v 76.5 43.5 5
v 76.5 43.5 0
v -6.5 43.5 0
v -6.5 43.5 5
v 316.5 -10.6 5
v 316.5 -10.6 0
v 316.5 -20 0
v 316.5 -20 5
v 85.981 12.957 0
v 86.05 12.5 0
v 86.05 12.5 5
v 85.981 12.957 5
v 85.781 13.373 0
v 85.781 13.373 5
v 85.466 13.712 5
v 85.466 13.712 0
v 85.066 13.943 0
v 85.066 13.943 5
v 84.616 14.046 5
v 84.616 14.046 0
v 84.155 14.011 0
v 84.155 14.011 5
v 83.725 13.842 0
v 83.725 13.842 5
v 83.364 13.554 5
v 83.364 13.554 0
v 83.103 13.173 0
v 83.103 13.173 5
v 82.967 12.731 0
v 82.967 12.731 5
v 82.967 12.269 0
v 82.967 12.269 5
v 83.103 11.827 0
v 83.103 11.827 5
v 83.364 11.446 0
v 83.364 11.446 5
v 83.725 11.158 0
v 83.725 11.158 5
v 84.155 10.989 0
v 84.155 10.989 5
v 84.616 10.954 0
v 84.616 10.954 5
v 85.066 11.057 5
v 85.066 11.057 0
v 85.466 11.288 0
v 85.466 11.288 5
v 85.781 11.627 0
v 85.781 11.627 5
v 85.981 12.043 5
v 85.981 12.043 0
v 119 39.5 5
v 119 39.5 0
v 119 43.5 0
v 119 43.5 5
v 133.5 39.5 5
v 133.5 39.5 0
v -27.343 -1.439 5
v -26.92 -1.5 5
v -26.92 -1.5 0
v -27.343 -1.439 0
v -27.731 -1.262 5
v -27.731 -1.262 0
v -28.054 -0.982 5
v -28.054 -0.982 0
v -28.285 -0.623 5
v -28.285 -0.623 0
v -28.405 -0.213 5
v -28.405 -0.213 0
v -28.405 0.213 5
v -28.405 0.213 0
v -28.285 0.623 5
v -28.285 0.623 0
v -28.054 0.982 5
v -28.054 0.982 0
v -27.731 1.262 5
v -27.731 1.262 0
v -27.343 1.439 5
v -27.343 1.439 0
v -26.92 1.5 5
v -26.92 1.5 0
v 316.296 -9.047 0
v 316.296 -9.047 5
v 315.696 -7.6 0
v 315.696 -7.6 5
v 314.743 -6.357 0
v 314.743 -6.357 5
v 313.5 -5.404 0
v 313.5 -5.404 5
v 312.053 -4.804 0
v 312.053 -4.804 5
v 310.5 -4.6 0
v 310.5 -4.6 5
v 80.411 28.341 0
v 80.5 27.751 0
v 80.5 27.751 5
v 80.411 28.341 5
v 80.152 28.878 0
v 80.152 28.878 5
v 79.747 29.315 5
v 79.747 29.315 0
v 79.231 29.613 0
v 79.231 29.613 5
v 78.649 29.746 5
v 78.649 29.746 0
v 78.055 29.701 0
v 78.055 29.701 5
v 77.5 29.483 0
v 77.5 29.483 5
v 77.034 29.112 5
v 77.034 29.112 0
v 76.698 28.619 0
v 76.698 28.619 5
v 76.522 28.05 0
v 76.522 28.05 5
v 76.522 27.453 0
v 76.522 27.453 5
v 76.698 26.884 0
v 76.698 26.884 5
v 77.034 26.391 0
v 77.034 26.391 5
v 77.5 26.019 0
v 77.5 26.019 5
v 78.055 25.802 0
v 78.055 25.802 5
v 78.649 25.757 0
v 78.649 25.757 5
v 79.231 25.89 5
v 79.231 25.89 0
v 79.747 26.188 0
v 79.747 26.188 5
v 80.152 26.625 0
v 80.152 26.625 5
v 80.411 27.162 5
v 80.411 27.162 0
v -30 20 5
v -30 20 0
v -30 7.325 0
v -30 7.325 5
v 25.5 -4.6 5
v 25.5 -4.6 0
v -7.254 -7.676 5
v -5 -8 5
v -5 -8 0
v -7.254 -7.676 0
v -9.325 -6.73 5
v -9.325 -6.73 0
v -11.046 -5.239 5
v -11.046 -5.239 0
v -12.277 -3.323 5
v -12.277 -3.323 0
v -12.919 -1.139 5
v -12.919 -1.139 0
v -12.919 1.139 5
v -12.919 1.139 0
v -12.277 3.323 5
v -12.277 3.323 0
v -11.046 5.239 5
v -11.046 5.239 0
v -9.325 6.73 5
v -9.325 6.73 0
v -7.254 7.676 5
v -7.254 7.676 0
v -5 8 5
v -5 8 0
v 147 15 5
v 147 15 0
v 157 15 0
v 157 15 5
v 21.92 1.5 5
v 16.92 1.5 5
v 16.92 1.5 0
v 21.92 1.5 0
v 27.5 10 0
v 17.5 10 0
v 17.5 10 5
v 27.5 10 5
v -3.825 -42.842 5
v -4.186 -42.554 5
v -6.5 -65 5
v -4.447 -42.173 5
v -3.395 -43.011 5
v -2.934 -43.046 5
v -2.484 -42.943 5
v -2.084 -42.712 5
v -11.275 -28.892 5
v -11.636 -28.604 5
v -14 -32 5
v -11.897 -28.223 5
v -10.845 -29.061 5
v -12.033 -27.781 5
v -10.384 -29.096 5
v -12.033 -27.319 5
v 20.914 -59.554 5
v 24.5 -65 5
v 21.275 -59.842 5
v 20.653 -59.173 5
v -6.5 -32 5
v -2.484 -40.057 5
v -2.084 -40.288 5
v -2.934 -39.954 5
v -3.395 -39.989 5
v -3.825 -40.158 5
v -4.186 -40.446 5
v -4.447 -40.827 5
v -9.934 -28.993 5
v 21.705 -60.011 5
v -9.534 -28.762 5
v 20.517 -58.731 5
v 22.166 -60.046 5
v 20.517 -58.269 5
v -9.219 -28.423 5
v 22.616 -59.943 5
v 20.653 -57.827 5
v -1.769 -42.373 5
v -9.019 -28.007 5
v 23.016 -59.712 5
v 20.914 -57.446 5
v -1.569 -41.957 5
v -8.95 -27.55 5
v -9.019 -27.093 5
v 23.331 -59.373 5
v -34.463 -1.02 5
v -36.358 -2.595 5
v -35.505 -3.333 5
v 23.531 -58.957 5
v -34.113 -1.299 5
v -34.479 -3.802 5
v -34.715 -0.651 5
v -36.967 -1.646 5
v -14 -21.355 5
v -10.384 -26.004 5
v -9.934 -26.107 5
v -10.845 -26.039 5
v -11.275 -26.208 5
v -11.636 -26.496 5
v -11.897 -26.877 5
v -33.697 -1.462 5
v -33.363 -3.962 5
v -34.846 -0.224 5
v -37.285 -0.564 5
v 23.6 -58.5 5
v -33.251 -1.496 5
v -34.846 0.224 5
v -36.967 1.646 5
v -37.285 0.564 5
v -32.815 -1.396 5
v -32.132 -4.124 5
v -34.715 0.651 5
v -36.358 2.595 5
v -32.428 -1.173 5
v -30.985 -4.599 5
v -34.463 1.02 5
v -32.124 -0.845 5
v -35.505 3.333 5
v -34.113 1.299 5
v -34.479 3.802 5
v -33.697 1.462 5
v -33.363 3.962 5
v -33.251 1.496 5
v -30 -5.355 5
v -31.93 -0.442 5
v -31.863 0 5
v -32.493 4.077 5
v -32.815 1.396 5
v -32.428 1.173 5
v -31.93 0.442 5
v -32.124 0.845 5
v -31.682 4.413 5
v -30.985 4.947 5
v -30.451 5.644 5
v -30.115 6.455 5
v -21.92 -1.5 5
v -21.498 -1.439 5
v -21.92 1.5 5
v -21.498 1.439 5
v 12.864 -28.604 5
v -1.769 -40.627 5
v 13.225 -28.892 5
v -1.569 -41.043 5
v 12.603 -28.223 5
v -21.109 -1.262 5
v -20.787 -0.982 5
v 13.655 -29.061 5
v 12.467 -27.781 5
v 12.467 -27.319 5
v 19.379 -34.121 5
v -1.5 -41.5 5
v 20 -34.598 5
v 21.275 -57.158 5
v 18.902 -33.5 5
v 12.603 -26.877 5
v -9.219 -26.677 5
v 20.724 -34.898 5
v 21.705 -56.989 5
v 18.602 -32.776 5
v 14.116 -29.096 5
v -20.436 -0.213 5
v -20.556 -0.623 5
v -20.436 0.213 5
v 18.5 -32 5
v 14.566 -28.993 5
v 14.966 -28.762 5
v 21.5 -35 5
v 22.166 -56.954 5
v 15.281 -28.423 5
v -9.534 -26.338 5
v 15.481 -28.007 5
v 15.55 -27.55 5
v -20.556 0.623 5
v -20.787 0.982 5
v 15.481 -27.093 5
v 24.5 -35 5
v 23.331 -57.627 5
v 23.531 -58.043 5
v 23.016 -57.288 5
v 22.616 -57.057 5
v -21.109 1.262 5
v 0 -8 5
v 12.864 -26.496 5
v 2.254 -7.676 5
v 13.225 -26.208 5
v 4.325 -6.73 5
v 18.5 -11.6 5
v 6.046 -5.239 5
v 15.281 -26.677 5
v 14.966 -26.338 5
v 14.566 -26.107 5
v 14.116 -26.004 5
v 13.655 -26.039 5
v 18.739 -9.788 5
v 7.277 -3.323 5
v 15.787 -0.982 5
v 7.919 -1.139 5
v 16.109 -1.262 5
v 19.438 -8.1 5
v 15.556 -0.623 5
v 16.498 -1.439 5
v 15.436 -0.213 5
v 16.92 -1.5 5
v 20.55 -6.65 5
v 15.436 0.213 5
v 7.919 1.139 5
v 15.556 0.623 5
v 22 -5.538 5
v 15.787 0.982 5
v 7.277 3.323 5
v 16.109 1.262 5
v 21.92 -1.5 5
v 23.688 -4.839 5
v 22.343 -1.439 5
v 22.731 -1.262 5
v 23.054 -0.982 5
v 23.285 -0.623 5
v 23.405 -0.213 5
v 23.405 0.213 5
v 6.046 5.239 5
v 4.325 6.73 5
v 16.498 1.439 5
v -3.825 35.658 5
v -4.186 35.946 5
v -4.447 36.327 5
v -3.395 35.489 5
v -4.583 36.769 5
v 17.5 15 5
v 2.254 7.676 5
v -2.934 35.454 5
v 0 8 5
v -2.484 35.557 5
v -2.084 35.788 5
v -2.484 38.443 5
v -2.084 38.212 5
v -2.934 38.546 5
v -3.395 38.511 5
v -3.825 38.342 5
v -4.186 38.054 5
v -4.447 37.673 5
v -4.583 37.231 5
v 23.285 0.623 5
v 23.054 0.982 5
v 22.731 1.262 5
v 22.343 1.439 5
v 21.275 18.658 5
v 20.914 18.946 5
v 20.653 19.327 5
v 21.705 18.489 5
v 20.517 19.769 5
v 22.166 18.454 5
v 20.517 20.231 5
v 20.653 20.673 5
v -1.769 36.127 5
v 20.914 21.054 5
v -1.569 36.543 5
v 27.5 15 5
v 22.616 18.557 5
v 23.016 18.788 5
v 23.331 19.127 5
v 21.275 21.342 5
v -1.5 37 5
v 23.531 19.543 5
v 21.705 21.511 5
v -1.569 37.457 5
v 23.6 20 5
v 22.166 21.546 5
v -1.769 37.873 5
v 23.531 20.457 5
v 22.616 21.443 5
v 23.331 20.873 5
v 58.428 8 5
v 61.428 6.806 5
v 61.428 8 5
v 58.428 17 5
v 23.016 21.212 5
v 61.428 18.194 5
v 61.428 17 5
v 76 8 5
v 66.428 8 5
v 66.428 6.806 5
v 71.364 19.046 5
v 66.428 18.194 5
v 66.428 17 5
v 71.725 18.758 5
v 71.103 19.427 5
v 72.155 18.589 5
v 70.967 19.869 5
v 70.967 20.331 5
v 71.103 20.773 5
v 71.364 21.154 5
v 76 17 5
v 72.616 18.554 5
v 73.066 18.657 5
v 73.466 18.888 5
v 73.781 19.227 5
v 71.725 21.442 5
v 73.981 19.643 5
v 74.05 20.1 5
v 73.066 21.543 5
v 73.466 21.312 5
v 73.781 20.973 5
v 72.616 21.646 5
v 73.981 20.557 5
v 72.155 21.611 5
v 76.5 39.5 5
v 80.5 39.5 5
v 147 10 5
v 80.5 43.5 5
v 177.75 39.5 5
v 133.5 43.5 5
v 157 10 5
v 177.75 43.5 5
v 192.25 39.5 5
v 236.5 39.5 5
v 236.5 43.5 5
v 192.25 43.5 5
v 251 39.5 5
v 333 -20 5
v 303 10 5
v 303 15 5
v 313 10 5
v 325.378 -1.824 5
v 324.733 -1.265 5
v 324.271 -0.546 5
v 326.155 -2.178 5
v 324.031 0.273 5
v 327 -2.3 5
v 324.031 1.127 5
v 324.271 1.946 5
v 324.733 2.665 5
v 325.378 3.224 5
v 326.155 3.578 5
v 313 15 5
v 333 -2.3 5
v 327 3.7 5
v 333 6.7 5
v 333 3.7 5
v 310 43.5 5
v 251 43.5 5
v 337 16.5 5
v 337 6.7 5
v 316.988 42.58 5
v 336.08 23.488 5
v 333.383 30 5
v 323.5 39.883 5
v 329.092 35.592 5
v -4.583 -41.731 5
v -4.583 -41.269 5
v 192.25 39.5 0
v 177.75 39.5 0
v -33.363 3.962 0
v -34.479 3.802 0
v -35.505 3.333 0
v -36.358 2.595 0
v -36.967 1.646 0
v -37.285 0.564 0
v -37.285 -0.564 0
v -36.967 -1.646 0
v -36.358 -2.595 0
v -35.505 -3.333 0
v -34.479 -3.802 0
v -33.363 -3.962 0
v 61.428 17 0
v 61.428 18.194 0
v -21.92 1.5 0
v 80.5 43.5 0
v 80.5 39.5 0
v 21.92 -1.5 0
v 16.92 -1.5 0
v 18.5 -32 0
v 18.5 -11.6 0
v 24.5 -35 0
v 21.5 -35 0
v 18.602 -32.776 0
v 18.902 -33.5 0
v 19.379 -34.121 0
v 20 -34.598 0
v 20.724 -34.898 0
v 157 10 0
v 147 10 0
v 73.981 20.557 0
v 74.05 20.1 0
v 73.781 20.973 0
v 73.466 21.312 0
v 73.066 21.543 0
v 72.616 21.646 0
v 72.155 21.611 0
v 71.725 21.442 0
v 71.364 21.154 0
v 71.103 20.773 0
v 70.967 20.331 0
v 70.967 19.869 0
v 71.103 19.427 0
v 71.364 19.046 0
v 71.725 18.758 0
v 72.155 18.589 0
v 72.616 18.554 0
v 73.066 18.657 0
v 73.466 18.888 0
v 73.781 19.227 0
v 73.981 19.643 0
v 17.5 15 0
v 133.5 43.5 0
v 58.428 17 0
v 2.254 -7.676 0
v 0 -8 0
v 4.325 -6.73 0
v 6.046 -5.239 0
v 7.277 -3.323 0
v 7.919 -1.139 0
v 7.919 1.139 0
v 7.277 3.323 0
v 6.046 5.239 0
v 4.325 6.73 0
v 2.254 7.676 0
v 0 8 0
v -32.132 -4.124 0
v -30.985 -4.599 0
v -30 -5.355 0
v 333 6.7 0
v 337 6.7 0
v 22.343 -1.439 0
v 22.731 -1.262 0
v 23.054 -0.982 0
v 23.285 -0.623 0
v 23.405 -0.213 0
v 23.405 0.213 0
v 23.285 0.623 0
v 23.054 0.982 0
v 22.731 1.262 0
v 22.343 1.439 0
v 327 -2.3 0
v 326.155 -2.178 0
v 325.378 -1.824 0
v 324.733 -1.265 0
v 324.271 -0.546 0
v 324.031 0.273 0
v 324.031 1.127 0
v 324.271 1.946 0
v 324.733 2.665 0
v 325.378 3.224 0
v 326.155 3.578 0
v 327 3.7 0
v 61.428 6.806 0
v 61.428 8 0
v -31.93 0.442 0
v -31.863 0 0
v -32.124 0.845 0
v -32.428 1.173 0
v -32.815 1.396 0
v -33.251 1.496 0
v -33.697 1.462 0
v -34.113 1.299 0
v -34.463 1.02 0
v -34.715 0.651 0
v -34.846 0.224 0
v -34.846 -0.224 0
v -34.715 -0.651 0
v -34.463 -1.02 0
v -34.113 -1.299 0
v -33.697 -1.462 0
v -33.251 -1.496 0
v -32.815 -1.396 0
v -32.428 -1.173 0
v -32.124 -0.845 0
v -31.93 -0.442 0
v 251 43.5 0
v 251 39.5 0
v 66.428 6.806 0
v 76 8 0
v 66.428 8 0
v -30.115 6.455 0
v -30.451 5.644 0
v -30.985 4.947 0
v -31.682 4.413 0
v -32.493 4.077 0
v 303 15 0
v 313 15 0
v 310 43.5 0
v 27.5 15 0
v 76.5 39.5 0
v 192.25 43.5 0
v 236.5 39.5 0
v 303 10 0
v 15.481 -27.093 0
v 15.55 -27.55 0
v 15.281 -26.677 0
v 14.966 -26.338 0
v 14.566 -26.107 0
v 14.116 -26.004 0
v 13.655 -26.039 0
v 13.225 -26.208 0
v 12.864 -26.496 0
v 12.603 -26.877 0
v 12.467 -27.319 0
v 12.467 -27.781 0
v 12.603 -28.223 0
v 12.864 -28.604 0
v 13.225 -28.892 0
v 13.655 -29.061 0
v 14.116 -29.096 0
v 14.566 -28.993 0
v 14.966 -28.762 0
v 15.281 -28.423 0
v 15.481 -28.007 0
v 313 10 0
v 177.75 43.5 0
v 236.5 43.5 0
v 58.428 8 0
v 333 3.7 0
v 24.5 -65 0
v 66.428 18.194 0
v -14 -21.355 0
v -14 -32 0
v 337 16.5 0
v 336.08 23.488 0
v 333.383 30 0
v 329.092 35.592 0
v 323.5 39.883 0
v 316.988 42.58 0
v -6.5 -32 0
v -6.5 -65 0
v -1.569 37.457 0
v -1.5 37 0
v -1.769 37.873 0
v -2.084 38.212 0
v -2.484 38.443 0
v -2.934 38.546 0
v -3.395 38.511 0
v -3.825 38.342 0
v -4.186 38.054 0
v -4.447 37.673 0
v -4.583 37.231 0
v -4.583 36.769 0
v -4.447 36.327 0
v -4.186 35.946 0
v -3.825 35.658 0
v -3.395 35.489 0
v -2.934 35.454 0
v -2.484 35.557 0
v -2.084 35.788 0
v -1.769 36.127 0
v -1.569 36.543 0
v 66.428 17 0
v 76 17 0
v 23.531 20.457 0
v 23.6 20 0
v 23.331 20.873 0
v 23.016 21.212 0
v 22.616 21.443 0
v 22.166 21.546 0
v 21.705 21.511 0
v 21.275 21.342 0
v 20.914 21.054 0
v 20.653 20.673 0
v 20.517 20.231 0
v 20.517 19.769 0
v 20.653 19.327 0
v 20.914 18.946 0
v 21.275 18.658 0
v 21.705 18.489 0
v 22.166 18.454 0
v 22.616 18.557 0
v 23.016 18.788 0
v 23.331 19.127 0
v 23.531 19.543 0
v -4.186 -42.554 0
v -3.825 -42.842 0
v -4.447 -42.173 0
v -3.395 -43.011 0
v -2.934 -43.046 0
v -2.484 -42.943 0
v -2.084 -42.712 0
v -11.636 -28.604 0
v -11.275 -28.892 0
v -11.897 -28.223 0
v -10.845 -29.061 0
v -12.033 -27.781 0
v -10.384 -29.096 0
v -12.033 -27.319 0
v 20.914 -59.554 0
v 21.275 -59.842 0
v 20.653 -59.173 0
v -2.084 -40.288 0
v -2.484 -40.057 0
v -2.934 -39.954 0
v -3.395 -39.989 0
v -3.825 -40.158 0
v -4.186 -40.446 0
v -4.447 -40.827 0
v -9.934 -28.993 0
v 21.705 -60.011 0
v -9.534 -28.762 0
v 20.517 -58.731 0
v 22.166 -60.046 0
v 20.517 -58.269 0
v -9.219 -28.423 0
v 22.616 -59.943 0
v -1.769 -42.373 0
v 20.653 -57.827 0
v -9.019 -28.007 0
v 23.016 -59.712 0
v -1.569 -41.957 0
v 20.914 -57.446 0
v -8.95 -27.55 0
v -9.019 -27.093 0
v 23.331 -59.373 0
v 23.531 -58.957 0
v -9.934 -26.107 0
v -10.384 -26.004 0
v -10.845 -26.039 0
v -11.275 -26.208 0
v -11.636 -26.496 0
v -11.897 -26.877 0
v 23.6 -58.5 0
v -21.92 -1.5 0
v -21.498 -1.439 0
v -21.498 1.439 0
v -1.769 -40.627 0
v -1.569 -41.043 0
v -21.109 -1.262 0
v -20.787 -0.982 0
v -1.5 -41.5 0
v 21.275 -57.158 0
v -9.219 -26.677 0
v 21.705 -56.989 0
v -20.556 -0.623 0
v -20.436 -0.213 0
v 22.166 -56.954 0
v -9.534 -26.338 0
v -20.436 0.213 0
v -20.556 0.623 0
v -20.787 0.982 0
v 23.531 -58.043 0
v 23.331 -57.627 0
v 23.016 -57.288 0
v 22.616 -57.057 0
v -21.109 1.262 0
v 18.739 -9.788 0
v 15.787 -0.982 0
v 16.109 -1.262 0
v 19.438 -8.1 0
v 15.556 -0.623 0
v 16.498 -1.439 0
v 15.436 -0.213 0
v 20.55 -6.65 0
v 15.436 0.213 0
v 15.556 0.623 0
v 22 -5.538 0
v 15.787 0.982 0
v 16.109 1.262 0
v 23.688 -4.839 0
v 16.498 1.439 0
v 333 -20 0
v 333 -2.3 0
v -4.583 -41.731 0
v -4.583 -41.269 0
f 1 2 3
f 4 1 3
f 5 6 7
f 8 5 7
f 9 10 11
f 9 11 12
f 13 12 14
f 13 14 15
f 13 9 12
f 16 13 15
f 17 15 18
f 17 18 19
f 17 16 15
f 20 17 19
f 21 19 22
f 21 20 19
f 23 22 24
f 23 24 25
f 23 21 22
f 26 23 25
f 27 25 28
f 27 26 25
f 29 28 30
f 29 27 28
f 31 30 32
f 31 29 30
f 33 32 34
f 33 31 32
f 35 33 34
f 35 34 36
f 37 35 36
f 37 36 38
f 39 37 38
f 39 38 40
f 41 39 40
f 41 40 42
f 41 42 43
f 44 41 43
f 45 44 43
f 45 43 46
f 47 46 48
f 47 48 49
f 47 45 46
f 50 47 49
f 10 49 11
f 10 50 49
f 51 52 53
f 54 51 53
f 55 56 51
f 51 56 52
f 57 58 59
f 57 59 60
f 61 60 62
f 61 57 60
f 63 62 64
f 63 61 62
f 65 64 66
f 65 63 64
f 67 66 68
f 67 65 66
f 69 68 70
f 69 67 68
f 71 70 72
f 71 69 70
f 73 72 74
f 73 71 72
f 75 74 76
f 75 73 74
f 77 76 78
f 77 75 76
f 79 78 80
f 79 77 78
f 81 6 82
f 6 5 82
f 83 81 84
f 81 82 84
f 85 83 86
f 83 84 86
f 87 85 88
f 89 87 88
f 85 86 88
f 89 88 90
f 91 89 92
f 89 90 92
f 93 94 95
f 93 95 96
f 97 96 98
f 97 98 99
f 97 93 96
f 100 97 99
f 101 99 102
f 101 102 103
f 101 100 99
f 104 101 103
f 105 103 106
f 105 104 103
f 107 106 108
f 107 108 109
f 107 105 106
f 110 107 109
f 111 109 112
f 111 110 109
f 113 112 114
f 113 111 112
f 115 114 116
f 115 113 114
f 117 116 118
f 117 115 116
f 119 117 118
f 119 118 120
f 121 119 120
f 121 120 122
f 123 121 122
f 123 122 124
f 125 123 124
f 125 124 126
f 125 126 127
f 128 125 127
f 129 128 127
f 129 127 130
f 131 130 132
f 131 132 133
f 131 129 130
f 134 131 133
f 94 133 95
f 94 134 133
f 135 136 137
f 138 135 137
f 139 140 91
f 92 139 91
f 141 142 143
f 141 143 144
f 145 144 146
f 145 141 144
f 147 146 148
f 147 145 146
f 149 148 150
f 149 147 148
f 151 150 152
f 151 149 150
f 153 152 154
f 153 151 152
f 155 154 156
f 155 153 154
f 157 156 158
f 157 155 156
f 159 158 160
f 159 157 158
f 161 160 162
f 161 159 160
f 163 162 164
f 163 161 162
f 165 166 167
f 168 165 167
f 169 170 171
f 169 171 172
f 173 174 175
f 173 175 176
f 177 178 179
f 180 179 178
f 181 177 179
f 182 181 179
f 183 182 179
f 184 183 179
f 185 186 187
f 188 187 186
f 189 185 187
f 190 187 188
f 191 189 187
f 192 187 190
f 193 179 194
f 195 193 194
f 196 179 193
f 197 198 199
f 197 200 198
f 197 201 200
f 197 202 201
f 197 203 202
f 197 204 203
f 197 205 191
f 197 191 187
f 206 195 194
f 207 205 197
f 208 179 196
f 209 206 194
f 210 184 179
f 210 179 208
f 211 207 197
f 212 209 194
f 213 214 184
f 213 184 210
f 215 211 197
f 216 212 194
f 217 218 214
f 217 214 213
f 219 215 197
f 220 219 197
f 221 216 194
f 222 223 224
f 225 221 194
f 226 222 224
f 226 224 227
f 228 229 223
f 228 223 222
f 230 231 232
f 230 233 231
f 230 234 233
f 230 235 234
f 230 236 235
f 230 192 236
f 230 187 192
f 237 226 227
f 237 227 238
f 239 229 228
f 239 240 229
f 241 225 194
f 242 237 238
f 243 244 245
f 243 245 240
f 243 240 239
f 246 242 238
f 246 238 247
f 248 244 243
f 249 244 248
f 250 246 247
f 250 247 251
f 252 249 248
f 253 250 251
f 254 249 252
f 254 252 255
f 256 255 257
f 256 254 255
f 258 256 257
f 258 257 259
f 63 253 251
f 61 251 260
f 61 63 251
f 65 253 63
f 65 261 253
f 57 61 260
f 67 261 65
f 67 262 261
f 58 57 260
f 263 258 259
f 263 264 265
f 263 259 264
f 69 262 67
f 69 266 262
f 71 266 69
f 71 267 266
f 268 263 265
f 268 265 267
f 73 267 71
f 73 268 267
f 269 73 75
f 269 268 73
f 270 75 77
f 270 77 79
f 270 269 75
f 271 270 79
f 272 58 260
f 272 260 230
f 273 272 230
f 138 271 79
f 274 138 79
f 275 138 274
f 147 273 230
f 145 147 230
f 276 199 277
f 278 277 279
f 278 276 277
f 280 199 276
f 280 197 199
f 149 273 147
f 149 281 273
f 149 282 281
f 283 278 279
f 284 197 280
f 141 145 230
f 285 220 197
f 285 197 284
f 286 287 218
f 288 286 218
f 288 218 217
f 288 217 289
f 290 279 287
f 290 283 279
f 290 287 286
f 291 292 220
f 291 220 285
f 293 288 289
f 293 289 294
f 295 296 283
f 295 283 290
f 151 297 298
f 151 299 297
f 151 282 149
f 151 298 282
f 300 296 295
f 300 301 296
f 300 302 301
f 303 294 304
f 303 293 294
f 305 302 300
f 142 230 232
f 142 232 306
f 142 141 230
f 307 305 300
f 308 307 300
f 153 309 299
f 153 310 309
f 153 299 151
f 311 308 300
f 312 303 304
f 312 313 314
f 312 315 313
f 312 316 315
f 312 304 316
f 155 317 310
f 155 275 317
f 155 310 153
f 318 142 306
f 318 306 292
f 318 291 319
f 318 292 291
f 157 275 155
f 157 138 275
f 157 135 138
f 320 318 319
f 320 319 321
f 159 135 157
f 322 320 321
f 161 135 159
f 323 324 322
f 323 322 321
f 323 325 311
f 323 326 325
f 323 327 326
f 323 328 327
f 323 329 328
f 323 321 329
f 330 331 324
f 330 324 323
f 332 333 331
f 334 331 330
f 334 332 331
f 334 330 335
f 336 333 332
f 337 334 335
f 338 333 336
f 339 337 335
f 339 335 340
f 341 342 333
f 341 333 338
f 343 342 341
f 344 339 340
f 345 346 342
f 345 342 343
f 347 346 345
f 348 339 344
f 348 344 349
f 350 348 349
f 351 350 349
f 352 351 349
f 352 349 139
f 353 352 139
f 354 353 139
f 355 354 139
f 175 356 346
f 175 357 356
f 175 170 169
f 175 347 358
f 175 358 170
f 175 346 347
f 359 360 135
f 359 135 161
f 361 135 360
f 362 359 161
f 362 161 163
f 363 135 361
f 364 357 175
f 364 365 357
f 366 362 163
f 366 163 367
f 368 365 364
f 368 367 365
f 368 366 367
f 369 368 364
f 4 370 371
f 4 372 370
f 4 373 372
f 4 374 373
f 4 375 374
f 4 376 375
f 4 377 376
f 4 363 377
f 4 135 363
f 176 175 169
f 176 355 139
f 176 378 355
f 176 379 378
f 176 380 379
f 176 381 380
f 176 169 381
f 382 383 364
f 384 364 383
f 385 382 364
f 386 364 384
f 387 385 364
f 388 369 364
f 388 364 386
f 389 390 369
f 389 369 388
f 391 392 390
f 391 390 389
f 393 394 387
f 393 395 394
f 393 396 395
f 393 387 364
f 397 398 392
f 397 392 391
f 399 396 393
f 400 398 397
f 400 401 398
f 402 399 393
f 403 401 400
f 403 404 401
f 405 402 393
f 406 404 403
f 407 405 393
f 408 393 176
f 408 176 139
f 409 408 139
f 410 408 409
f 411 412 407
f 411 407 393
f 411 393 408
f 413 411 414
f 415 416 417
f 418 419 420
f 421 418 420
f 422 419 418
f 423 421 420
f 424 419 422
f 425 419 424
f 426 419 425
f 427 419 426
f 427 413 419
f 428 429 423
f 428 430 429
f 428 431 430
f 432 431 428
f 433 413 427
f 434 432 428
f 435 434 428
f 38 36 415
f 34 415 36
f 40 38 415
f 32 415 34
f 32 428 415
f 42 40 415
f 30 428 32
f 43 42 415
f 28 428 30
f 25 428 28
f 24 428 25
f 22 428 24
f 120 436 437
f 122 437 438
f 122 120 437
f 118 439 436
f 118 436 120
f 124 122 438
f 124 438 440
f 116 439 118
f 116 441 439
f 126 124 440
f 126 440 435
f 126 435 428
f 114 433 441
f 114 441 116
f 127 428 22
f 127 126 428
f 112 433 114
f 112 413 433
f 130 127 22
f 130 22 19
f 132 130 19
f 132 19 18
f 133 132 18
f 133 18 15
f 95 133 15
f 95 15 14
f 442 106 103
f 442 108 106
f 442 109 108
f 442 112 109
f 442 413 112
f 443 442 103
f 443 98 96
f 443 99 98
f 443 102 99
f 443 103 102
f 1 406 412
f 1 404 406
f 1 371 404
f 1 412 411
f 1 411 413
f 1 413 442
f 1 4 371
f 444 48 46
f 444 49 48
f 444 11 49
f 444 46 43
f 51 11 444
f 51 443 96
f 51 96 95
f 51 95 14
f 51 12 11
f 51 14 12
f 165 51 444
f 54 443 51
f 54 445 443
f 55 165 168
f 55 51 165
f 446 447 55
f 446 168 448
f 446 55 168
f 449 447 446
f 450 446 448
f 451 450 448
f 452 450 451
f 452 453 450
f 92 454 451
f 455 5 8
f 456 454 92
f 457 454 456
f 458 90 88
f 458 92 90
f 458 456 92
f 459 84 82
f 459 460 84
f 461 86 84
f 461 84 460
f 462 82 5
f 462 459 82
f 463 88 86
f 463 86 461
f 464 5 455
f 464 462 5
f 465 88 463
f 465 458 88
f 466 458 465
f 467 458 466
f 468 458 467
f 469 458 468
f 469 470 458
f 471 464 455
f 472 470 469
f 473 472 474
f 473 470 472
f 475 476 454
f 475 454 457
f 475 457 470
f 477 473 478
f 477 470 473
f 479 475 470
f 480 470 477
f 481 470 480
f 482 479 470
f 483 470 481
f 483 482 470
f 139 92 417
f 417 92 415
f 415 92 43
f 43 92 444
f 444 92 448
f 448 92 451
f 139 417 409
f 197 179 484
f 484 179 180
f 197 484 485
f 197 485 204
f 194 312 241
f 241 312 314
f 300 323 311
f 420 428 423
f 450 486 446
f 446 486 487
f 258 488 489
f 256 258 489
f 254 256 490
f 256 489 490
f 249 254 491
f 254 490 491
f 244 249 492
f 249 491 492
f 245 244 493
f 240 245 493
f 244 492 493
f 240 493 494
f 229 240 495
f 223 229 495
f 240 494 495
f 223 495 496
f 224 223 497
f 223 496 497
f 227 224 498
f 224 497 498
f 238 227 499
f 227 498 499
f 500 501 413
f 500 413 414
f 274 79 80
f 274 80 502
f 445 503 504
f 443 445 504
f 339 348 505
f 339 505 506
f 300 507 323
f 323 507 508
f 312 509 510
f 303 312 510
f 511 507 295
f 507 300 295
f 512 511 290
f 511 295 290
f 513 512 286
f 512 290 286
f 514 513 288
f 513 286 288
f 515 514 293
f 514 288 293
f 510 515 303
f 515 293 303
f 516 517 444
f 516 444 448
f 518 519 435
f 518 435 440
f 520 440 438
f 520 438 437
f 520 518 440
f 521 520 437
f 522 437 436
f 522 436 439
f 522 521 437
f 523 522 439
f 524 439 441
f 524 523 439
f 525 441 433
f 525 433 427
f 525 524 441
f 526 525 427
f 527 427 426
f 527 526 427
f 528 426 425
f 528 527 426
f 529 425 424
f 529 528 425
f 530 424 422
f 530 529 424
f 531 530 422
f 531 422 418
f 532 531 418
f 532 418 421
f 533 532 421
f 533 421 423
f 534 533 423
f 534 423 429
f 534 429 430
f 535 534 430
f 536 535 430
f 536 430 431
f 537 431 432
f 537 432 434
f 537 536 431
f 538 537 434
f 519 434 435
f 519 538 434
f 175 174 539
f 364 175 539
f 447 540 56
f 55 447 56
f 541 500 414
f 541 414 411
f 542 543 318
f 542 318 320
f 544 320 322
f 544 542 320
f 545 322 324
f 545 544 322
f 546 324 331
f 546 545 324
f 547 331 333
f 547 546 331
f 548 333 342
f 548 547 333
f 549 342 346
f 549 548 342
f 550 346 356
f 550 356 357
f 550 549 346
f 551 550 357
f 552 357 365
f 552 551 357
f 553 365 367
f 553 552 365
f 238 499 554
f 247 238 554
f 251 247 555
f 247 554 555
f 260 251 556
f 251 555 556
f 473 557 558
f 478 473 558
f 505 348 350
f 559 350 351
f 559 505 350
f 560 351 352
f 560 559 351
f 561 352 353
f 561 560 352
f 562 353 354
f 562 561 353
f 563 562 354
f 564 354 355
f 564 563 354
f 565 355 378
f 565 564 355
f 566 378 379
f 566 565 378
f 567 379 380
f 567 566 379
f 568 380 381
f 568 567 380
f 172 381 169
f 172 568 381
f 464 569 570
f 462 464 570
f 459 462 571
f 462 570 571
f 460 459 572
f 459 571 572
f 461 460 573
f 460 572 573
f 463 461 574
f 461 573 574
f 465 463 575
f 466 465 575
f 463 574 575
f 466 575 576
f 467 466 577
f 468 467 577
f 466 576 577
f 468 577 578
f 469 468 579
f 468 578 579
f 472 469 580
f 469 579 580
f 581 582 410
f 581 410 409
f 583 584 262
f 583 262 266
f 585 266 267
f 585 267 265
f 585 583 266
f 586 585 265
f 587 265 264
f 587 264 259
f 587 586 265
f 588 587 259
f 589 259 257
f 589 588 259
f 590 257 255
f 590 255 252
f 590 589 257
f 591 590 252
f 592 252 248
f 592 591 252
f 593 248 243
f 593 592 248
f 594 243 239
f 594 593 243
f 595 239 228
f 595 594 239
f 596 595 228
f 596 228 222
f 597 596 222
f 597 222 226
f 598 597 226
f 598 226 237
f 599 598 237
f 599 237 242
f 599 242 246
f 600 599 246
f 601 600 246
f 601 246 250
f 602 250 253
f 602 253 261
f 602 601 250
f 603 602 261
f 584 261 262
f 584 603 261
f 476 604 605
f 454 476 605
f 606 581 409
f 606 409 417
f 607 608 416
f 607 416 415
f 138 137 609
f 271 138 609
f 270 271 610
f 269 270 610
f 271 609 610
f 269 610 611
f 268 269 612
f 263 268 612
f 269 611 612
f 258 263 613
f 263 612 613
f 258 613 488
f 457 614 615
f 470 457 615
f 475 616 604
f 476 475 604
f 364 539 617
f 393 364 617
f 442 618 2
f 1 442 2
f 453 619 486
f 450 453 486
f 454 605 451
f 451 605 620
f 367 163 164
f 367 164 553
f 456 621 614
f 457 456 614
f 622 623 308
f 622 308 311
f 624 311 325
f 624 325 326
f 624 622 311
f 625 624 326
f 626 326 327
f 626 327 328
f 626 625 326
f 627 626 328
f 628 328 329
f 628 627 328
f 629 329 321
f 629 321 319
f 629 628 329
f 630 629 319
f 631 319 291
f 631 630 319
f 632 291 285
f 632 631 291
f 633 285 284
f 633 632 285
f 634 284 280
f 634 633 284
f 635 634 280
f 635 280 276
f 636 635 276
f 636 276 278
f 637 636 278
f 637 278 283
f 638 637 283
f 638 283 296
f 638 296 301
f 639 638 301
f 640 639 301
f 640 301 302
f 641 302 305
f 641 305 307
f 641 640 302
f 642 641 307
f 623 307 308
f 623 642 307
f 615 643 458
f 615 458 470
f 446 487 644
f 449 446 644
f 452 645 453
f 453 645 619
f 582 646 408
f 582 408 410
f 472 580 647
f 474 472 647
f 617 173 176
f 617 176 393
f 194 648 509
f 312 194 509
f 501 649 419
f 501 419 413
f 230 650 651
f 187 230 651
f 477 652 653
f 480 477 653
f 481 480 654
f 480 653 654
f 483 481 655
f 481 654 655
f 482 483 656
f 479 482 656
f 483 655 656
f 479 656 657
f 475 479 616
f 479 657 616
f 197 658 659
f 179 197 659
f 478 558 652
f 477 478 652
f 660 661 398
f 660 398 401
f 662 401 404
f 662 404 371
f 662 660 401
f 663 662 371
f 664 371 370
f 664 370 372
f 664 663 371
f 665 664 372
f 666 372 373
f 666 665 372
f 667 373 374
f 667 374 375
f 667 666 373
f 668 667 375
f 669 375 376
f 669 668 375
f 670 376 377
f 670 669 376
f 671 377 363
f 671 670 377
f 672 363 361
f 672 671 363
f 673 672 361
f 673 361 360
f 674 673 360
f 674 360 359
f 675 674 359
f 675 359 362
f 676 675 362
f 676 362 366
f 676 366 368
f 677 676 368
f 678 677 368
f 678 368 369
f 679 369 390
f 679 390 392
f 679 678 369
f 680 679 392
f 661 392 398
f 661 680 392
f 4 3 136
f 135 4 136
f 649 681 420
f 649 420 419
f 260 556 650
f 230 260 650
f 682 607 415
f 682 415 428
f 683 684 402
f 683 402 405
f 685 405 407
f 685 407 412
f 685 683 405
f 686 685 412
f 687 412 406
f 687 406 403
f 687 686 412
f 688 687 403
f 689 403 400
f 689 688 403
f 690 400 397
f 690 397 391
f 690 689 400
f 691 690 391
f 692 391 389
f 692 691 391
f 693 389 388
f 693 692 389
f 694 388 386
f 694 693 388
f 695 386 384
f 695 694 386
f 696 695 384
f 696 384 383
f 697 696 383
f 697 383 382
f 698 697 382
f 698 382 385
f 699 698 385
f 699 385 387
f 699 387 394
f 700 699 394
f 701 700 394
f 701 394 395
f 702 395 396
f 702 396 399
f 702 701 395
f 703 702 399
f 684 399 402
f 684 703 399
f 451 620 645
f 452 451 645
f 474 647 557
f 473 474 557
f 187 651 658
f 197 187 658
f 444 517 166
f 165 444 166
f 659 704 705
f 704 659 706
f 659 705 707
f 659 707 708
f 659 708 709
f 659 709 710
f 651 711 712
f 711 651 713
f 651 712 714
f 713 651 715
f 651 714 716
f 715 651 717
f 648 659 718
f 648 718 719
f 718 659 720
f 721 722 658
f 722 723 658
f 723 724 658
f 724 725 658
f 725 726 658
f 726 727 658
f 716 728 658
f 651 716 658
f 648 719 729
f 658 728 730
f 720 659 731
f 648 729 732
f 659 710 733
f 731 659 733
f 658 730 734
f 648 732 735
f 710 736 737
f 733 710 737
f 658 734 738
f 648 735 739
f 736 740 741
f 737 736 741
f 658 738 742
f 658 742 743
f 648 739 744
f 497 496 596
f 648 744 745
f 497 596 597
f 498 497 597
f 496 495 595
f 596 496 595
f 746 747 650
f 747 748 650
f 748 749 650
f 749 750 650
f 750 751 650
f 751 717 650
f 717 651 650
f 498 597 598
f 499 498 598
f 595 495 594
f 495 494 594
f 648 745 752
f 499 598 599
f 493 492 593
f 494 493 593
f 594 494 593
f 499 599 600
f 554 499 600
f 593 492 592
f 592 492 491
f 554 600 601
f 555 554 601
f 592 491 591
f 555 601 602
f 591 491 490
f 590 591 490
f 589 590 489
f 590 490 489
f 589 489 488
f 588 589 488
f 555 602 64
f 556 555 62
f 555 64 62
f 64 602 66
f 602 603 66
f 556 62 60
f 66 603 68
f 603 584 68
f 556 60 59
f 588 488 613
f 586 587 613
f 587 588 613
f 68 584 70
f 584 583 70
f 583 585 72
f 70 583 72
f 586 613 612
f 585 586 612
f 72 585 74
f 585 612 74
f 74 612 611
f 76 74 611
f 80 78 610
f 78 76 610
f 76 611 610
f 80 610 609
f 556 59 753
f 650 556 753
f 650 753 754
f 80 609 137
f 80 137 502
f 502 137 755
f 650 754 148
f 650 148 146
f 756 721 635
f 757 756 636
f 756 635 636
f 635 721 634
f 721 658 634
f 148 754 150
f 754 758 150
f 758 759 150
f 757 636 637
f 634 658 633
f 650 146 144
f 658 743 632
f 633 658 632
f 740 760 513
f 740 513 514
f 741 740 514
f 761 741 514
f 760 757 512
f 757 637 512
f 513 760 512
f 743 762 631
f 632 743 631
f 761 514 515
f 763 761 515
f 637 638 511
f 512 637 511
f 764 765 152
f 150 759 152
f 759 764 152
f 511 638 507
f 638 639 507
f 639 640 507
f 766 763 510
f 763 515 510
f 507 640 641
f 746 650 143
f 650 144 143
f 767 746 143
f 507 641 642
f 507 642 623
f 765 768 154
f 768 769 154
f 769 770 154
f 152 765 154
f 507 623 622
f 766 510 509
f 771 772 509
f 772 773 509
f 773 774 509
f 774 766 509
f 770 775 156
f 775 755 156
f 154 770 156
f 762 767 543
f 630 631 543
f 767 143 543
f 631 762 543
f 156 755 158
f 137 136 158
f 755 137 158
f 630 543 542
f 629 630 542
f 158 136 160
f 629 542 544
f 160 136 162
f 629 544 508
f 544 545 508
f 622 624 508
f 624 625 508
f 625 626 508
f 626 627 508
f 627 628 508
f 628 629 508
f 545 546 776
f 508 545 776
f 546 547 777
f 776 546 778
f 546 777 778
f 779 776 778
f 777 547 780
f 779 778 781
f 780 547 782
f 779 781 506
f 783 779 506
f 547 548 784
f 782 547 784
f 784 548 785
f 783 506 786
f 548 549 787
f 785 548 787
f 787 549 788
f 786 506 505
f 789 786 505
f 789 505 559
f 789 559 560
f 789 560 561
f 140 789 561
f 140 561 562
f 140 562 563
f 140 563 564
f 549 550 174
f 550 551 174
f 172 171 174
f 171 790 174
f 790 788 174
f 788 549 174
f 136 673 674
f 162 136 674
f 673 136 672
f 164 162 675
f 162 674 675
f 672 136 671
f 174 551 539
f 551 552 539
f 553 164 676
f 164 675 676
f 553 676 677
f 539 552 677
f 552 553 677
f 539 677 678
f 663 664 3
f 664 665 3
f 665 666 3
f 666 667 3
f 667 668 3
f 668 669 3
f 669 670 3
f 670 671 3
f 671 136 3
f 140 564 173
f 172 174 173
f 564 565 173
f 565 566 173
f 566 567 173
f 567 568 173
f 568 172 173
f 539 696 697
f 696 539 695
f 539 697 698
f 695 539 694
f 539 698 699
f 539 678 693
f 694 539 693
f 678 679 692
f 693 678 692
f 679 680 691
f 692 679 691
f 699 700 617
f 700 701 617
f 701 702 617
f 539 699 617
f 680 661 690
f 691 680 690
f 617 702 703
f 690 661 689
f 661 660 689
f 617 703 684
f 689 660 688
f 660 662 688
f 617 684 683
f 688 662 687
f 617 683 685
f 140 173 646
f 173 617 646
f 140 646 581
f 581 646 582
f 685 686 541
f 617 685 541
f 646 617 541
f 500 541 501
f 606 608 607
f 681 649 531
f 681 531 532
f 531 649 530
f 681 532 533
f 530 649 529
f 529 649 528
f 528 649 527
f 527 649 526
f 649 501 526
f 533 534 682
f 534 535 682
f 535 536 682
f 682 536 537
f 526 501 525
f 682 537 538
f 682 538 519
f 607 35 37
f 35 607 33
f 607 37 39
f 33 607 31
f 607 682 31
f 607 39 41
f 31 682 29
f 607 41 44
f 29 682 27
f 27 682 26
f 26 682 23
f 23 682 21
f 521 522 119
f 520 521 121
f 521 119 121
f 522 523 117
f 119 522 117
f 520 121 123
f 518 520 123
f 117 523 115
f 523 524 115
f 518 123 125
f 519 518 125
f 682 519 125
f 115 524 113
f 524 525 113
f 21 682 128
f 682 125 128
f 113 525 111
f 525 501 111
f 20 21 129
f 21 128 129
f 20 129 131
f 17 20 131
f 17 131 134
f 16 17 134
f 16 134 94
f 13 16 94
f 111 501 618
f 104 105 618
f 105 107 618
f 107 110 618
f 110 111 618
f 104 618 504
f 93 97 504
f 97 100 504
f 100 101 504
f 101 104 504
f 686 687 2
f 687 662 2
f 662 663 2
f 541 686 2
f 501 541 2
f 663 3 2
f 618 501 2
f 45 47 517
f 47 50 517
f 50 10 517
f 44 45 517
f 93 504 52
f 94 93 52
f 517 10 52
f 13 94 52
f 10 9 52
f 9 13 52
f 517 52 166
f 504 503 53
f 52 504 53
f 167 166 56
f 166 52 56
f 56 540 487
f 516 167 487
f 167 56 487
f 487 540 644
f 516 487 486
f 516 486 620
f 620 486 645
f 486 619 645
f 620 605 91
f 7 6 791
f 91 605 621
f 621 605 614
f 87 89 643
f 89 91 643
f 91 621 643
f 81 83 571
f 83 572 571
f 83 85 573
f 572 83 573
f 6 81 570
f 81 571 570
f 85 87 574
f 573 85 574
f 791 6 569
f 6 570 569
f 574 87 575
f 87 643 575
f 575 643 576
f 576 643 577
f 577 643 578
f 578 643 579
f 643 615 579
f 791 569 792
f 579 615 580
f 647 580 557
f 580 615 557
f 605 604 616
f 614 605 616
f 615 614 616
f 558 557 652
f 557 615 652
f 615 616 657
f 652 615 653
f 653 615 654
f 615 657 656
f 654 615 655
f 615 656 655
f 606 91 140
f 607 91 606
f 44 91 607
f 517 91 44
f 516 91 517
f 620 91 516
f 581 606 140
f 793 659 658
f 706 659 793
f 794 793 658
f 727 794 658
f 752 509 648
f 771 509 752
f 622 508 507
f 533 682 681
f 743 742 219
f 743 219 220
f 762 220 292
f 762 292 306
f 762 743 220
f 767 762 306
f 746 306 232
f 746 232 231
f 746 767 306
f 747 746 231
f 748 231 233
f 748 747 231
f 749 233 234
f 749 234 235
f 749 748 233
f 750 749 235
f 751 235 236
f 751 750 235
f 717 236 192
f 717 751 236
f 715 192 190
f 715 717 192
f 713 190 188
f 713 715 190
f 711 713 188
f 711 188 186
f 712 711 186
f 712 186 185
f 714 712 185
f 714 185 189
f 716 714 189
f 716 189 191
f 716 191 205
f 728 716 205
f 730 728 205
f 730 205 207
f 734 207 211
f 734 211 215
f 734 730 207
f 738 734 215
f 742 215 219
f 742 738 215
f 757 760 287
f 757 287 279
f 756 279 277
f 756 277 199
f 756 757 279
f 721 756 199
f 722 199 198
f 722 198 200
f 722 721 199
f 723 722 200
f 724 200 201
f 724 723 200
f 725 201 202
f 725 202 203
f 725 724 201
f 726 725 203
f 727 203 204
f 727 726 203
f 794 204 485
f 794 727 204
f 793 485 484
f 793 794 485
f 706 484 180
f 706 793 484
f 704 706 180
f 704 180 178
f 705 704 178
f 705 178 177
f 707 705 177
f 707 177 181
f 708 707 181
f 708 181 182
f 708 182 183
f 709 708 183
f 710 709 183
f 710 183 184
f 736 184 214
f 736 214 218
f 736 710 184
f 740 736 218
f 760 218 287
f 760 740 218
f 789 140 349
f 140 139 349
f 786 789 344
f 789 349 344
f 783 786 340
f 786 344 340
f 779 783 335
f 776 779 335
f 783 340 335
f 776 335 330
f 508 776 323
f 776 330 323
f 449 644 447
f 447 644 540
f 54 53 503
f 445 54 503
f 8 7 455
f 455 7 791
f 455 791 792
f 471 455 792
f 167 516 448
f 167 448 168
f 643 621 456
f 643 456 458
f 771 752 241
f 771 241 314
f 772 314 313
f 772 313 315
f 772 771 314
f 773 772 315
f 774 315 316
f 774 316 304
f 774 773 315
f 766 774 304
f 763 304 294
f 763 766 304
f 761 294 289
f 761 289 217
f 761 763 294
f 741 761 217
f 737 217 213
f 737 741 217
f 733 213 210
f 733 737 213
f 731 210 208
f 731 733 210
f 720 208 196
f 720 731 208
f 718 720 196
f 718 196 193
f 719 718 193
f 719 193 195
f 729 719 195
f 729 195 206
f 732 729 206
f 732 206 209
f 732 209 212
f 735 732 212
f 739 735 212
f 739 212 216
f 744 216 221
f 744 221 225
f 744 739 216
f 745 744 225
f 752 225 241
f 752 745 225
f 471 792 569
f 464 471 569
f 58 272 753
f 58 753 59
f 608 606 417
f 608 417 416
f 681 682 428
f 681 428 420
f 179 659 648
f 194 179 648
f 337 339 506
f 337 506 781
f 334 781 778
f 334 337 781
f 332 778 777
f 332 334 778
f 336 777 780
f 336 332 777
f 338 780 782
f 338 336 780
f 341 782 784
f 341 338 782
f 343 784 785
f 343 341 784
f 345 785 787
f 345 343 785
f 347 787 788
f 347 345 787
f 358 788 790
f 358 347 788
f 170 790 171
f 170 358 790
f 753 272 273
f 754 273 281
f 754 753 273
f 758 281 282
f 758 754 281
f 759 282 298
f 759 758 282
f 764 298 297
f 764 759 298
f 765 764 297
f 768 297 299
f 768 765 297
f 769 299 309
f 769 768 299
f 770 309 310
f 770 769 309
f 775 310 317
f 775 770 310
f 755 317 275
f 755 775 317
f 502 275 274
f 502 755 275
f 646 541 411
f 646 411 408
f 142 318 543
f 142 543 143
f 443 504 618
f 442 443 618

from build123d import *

# Parameters (mm, degrees)
SKETCH1_R           = 1.5
SKETCH1_R_2         = 8
SKETCH1_R_3         = 1.55
SKETCH1_R_4         = 2
SKETCH1_W           = 10
SKETCH1_H           = 5
BOSS_EXTRUDE1_DEPTH = 5
FILLET2_R           = 7
FILLET3_R           = 3
CUT_EXTRUDE1_DEPTH  = 6
FILLET4_R           = 6


with BuildPart() as part:
    # Sketch1 → Boss-Extrude1 (new body)
    with BuildSketch(Plane.XY):
        with BuildLine():
            Line((310, 43.5), (251, 43.5))
            Line((251, 43.5), (251, 39.5))
            Line((251, 39.5), (236.5, 39.5))
            Line((236.5, 39.5), (236.5, 43.5))
            Line((236.5, 43.5), (192.25, 43.5))
            Line((192.25, 43.5), (192.25, 39.5))
            Line((192.25, 39.5), (177.75, 39.5))
            Line((177.75, 39.5), (177.75, 43.5))
            Line((177.75, 43.5), (133.5, 43.5))
            Line((133.5, 43.5), (133.5, 39.5))
            Line((133.5, 39.5), (119, 39.5))
            Line((119, 39.5), (119, 43.5))
            Line((119, 43.5), (80.5, 43.5))
            Line((80.5, 43.5), (80.5, 39.5))
            Line((80.5, 39.5), (76.5, 39.5))
            Line((76.5, 39.5), (76.5, 43.5))
            Line((76.5, 43.5), (-6.5, 43.5))
            Line((-6.5, 43.5), (-30, 20))
            Line((-30, 20), (-30, 7.325414703))
            ThreePointArc((-30, 7.325414703), (-30.985037822, 4.947323034), (-33.36312949, 3.962285212))
            ThreePointArc((-33.36312949, 3.962285212), (-37.325414703, 0), (-33.36312949, -3.962285212))
            ThreePointArc((-33.36312949, -3.962285212), (-31.543016926, -4.324328111), (-30, -5.355339059))
            Line((-30, -5.355339059), (-14, -21.355339059))
            Line((-14, -21.355339059), (-14, -32))
            Line((-14, -32), (-6.5, -32))
            Line((-6.5, -32), (-6.5, -65))
            Line((-6.5, -65), (24.5, -65))
            Line((24.5, -65), (24.5, -35))
            Line((24.5, -35), (18.5, -35))
            Line((18.5, -35), (18.5, -4.6))
            Line((18.5, -4.6), (316.5, -4.6))
            Line((316.5, -4.6), (316.5, -20))
            Line((316.5, -20), (333, -20))
            Line((333, -20), (333, -2.3))
            Line((333, -2.3), (327, -2.3))
            ThreePointArc((327, -2.3), (324, 0.7), (327, 3.7))
            Line((327, 3.7), (333, 3.7))
            Line((333, 3.7), (333, 6.7))
            Line((333, 6.7), (337, 6.7))
            Line((337, 6.7), (337, 16.5))
            ThreePointArc((337, 16.5), (329.091883092, 35.591883092), (310, 43.5))
        make_face()
        with Locations((21.920310217, 0)):
            Circle(SKETCH1_R, mode=Mode.SUBTRACT)
        with Locations((-21.920310217, 0)):
            Circle(SKETCH1_R, mode=Mode.SUBTRACT)
        Circle(SKETCH1_R_2, mode=Mode.SUBTRACT)
        with Locations((-3.05, 37)):
            Circle(SKETCH1_R_3, mode=Mode.SUBTRACT)
        with Locations((22.05, 20)):
            Circle(SKETCH1_R_3, mode=Mode.SUBTRACT)
        with Locations((-3.05, -41.5)):
            Circle(SKETCH1_R_3, mode=Mode.SUBTRACT)
        with Locations((22.05, -58.5)):
            Circle(SKETCH1_R_3, mode=Mode.SUBTRACT)
        with Locations((72.5, 20.1)):
            Circle(SKETCH1_R_3, mode=Mode.SUBTRACT)
        with Locations((84.5, 12.5)):
            Circle(SKETCH1_R_3, mode=Mode.SUBTRACT)
        with Locations((-10.5, -27.55)):
            Circle(SKETCH1_R_3, mode=Mode.SUBTRACT)
        with Locations((14, -27.55)):
            Circle(SKETCH1_R_3, mode=Mode.SUBTRACT)
        with Locations((-33.36312949, 0)):
            Circle(SKETCH1_R, mode=Mode.SUBTRACT)
        with Locations((78.5, 27.751425951)):
            Circle(SKETCH1_R_4, mode=Mode.SUBTRACT)
        with Locations((22.5, 12.5)):
            Rectangle(SKETCH1_W, SKETCH1_H, mode=Mode.SUBTRACT)
        with Locations((152, 12.5)):
            Rectangle(SKETCH1_W, SKETCH1_H, mode=Mode.SUBTRACT)
        with Locations((308, 12.5)):
            Rectangle(SKETCH1_W, SKETCH1_H, mode=Mode.SUBTRACT)
        Polygon((58.427680349, 8), (61.427680349, 8), (61.427680349, 6.806102344), (66.427680349, 6.806102344), (66.427680349, 8), (76, 8), (76, 17), (66.427680349, 17), (66.427680349, 18.193897656), (61.427680349, 18.193897656), (61.427680349, 17), (58.427680349, 17), align=None, mode=Mode.SUBTRACT)
    extrude(amount=BOSS_EXTRUDE1_DEPTH)

    # Fillet2
    fillet2_edges = [part.edges().sort_by_distance(p)[0] for p in [
        (18.5, -4.6, 2.5),
    ]]
    fillet(fillet2_edges, radius=FILLET2_R)

    # Fillet3
    fillet3_edges = [part.edges().sort_by_distance(p)[0] for p in [
        (18.5, -35, 2.5),
    ]]
    fillet(fillet3_edges, radius=FILLET3_R)

    # Sketch2 → Cut-Extrude1 (cut, through all)
    with BuildSketch(Plane.XY.offset(5)):
        with BuildLine():
            Line((21.920310217, -1.5), (16.920310217, -1.5))
            ThreePointArc((16.920310217, -1.5), (15.420310217, 0), (16.920310217, 1.5))
            Line((16.920310217, 1.5), (21.920310217, 1.5))
            ThreePointArc((21.920310217, 1.5), (23.420310217, 0), (21.920310217, -1.5))
        make_face()
        with BuildLine():
            Line((0, -8), (-5, -8))
            ThreePointArc((-5, -8), (-13, 0), (-5, 8))
            Line((-5, 8), (0, 8))
            ThreePointArc((0, 8), (8, 0), (0, -8))
        make_face()
        with BuildLine():
            Line((-21.920310217, -1.5), (-26.920310217, -1.5))
            ThreePointArc((-26.920310217, -1.5), (-28.420310217, 0), (-26.920310217, 1.5))
            Line((-26.920310217, 1.5), (-21.920310217, 1.5))
            ThreePointArc((-21.920310217, 1.5), (-20.420310217, 0), (-21.920310217, -1.5))
        make_face()
    extrude(amount=-CUT_EXTRUDE1_DEPTH, mode=Mode.SUBTRACT)

    # Fillet4
    fillet4_edges = [part.edges().sort_by_distance(p)[0] for p in [
        (316.5, -4.6, 2.5),
    ]]
    fillet(fillet4_edges, radius=FILLET4_R)


solid = part.part
